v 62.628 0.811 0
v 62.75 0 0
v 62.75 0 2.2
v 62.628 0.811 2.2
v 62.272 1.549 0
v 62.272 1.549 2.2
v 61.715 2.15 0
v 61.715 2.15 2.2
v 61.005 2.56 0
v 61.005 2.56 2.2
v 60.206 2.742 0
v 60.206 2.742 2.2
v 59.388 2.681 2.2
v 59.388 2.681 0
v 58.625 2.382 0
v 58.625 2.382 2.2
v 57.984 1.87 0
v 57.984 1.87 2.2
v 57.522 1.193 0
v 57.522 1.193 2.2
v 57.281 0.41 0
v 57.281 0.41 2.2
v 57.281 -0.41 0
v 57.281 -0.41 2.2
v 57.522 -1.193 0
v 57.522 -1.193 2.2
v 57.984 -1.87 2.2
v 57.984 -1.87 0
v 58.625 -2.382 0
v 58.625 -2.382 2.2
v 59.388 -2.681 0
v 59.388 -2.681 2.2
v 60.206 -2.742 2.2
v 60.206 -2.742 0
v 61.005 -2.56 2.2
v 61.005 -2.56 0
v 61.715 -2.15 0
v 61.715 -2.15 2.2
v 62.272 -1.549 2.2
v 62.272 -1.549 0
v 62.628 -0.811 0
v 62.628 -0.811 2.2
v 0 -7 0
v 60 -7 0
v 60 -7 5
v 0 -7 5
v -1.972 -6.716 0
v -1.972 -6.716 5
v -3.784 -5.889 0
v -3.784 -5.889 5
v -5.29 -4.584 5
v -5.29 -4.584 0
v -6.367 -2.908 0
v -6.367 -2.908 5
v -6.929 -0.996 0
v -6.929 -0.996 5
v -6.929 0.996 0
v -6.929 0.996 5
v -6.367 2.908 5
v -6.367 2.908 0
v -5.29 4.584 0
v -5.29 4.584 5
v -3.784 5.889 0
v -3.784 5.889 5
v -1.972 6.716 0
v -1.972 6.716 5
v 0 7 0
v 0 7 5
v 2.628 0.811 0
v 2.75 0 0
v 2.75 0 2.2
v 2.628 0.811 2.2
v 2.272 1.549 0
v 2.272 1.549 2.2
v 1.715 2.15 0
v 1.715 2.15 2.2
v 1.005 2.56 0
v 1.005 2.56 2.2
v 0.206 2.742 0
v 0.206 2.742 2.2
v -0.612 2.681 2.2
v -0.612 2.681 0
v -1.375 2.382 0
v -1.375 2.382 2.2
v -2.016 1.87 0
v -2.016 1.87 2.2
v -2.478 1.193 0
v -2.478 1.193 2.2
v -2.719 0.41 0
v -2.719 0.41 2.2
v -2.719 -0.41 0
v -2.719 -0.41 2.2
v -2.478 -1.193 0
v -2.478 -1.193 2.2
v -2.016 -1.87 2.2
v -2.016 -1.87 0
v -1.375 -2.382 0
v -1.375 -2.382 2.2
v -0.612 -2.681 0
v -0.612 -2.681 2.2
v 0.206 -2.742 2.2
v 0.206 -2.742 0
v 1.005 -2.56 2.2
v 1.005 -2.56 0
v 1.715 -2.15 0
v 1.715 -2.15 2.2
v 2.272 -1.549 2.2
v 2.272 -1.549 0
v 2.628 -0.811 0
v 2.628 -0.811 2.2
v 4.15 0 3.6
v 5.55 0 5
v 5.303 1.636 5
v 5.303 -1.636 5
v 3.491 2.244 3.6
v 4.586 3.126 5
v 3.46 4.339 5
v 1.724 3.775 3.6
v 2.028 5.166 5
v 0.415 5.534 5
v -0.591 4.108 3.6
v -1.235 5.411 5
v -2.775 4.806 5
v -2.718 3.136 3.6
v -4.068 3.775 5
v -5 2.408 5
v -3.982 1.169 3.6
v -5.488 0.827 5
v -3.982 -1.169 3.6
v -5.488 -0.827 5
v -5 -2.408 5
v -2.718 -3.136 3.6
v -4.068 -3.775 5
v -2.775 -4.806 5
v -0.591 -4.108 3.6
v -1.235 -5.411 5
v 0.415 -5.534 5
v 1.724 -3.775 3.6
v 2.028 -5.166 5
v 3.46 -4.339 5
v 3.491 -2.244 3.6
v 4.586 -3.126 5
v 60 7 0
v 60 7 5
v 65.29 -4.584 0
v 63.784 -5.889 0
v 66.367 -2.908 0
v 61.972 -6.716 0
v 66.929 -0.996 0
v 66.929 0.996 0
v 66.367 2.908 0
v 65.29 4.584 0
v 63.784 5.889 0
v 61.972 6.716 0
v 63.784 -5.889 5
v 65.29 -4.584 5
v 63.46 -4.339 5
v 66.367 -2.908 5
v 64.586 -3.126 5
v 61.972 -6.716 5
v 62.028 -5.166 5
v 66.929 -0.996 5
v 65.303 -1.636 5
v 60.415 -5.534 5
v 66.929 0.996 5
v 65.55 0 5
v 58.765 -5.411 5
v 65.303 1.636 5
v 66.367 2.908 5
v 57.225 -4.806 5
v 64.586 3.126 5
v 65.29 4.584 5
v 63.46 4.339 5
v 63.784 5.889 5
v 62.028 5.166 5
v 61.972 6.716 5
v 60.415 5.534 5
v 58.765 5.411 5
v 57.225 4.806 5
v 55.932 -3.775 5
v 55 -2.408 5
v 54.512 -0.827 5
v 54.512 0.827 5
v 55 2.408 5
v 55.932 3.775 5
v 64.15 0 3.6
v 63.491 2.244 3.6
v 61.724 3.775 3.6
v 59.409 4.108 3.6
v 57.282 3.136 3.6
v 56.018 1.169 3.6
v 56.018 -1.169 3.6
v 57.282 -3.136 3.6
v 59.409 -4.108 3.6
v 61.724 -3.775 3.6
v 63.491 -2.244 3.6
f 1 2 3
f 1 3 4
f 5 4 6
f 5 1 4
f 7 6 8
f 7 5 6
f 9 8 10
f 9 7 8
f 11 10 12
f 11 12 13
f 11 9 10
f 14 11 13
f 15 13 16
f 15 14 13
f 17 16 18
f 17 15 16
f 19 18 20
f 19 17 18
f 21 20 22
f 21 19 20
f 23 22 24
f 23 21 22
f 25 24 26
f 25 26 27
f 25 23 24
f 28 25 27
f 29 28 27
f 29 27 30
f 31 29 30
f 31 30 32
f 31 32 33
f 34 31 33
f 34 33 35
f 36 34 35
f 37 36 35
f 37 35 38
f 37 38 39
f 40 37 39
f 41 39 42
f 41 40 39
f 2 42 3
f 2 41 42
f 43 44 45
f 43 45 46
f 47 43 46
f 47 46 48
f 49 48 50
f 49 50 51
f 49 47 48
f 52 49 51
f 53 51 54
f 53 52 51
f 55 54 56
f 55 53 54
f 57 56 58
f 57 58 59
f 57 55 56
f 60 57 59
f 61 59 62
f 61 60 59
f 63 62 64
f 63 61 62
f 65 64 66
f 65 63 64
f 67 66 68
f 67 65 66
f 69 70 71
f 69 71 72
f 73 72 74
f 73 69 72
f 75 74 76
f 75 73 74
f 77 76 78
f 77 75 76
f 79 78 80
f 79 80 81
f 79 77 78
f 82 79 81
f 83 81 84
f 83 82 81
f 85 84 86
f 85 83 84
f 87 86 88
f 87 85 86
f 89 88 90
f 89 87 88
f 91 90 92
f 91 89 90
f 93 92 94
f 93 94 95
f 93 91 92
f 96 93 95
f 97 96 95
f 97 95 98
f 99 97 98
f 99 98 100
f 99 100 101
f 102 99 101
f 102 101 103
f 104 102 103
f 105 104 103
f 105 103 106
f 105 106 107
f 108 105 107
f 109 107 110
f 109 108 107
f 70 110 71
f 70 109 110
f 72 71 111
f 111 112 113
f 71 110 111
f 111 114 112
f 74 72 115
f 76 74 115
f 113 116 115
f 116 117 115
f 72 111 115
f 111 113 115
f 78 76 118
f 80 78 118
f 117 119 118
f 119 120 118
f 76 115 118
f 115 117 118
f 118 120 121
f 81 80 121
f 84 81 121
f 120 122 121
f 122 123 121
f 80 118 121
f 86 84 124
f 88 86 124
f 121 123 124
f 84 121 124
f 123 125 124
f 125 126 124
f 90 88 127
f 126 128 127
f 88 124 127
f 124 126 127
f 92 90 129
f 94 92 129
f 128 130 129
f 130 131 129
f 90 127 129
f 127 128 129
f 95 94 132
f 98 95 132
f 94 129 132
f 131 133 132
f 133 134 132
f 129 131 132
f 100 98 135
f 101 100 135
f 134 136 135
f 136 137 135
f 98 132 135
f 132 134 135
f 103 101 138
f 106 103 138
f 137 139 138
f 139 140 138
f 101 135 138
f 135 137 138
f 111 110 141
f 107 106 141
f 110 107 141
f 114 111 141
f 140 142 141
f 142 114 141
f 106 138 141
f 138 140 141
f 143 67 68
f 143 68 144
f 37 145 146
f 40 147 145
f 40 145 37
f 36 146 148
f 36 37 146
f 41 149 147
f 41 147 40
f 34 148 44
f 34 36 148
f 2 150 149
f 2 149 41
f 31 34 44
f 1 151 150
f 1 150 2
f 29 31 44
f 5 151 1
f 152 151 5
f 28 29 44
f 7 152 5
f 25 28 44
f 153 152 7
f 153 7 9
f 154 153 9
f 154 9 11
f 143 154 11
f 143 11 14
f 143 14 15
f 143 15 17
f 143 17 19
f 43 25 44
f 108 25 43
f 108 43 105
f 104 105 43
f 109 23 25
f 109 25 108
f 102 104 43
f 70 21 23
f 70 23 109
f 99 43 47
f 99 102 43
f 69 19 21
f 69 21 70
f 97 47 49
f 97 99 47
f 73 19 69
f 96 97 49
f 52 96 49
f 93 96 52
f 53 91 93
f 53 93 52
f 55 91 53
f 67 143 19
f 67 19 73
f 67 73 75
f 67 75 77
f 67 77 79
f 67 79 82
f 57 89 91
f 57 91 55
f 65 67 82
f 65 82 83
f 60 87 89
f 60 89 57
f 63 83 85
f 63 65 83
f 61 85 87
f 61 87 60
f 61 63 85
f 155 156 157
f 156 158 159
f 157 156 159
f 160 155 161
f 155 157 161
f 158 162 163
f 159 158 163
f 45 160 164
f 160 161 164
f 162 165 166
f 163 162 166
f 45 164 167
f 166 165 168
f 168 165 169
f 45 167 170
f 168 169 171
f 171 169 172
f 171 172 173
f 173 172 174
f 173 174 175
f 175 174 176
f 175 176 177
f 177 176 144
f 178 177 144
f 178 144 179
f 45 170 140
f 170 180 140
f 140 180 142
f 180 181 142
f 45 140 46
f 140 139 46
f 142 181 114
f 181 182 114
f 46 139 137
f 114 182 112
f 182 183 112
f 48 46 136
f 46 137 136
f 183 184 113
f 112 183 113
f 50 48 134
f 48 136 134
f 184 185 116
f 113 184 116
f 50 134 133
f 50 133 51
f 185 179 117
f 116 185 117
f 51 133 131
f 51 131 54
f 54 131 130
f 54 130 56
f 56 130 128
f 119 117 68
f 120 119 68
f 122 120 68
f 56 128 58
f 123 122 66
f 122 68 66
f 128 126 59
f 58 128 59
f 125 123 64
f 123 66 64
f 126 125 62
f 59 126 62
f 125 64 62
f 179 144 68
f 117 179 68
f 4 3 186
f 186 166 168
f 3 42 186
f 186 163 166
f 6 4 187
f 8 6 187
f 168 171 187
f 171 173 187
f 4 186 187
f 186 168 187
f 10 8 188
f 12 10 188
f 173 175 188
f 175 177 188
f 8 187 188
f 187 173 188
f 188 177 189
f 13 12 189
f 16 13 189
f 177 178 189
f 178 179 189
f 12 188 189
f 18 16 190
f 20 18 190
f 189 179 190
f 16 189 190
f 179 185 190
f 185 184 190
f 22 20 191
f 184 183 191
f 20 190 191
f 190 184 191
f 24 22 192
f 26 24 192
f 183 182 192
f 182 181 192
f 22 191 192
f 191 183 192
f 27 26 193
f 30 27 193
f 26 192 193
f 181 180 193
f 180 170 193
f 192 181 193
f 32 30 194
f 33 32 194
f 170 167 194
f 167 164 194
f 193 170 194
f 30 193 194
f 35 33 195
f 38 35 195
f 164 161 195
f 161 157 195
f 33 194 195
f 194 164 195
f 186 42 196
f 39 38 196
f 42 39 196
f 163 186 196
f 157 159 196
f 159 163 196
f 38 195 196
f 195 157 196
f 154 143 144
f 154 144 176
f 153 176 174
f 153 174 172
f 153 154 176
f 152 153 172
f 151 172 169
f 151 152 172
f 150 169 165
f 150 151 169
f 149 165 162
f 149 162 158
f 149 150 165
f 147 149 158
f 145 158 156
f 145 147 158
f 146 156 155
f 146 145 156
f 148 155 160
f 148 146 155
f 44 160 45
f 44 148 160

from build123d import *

# Parameters (mm, degrees)
ESQUISSE1_R        = 2.75
BOSS_EXTRU_1_DEPTH = 5
CHANFREIN1_SIZE    = 2.8


with BuildPart() as part:
    # Esquisse1 → Boss.-Extru.1 (new body)
    with BuildSketch(Plane.XY):
        with BuildLine():
            Line((0, 7), (60, 7))
            ThreePointArc((60, 7), (67, 0), (60, -7))
            Line((60, -7), (0, -7))
            ThreePointArc((0, -7), (-7, 0), (0, 7))
        make_face()
        with Locations((60, 0)):
            Circle(ESQUISSE1_R, mode=Mode.SUBTRACT)
        Circle(ESQUISSE1_R, mode=Mode.SUBTRACT)
    extrude(amount=BOSS_EXTRU_1_DEPTH)

    # Chanfrein1
    chanfrein1_edges = [part.edges().sort_by_distance(p)[0] for p in [
        (57.25, 0, 5),
        (-2.75, 0, 5),
    ]]
    chamfer(chanfrein1_edges, length=CHANFREIN1_SIZE)


solid = part.part
